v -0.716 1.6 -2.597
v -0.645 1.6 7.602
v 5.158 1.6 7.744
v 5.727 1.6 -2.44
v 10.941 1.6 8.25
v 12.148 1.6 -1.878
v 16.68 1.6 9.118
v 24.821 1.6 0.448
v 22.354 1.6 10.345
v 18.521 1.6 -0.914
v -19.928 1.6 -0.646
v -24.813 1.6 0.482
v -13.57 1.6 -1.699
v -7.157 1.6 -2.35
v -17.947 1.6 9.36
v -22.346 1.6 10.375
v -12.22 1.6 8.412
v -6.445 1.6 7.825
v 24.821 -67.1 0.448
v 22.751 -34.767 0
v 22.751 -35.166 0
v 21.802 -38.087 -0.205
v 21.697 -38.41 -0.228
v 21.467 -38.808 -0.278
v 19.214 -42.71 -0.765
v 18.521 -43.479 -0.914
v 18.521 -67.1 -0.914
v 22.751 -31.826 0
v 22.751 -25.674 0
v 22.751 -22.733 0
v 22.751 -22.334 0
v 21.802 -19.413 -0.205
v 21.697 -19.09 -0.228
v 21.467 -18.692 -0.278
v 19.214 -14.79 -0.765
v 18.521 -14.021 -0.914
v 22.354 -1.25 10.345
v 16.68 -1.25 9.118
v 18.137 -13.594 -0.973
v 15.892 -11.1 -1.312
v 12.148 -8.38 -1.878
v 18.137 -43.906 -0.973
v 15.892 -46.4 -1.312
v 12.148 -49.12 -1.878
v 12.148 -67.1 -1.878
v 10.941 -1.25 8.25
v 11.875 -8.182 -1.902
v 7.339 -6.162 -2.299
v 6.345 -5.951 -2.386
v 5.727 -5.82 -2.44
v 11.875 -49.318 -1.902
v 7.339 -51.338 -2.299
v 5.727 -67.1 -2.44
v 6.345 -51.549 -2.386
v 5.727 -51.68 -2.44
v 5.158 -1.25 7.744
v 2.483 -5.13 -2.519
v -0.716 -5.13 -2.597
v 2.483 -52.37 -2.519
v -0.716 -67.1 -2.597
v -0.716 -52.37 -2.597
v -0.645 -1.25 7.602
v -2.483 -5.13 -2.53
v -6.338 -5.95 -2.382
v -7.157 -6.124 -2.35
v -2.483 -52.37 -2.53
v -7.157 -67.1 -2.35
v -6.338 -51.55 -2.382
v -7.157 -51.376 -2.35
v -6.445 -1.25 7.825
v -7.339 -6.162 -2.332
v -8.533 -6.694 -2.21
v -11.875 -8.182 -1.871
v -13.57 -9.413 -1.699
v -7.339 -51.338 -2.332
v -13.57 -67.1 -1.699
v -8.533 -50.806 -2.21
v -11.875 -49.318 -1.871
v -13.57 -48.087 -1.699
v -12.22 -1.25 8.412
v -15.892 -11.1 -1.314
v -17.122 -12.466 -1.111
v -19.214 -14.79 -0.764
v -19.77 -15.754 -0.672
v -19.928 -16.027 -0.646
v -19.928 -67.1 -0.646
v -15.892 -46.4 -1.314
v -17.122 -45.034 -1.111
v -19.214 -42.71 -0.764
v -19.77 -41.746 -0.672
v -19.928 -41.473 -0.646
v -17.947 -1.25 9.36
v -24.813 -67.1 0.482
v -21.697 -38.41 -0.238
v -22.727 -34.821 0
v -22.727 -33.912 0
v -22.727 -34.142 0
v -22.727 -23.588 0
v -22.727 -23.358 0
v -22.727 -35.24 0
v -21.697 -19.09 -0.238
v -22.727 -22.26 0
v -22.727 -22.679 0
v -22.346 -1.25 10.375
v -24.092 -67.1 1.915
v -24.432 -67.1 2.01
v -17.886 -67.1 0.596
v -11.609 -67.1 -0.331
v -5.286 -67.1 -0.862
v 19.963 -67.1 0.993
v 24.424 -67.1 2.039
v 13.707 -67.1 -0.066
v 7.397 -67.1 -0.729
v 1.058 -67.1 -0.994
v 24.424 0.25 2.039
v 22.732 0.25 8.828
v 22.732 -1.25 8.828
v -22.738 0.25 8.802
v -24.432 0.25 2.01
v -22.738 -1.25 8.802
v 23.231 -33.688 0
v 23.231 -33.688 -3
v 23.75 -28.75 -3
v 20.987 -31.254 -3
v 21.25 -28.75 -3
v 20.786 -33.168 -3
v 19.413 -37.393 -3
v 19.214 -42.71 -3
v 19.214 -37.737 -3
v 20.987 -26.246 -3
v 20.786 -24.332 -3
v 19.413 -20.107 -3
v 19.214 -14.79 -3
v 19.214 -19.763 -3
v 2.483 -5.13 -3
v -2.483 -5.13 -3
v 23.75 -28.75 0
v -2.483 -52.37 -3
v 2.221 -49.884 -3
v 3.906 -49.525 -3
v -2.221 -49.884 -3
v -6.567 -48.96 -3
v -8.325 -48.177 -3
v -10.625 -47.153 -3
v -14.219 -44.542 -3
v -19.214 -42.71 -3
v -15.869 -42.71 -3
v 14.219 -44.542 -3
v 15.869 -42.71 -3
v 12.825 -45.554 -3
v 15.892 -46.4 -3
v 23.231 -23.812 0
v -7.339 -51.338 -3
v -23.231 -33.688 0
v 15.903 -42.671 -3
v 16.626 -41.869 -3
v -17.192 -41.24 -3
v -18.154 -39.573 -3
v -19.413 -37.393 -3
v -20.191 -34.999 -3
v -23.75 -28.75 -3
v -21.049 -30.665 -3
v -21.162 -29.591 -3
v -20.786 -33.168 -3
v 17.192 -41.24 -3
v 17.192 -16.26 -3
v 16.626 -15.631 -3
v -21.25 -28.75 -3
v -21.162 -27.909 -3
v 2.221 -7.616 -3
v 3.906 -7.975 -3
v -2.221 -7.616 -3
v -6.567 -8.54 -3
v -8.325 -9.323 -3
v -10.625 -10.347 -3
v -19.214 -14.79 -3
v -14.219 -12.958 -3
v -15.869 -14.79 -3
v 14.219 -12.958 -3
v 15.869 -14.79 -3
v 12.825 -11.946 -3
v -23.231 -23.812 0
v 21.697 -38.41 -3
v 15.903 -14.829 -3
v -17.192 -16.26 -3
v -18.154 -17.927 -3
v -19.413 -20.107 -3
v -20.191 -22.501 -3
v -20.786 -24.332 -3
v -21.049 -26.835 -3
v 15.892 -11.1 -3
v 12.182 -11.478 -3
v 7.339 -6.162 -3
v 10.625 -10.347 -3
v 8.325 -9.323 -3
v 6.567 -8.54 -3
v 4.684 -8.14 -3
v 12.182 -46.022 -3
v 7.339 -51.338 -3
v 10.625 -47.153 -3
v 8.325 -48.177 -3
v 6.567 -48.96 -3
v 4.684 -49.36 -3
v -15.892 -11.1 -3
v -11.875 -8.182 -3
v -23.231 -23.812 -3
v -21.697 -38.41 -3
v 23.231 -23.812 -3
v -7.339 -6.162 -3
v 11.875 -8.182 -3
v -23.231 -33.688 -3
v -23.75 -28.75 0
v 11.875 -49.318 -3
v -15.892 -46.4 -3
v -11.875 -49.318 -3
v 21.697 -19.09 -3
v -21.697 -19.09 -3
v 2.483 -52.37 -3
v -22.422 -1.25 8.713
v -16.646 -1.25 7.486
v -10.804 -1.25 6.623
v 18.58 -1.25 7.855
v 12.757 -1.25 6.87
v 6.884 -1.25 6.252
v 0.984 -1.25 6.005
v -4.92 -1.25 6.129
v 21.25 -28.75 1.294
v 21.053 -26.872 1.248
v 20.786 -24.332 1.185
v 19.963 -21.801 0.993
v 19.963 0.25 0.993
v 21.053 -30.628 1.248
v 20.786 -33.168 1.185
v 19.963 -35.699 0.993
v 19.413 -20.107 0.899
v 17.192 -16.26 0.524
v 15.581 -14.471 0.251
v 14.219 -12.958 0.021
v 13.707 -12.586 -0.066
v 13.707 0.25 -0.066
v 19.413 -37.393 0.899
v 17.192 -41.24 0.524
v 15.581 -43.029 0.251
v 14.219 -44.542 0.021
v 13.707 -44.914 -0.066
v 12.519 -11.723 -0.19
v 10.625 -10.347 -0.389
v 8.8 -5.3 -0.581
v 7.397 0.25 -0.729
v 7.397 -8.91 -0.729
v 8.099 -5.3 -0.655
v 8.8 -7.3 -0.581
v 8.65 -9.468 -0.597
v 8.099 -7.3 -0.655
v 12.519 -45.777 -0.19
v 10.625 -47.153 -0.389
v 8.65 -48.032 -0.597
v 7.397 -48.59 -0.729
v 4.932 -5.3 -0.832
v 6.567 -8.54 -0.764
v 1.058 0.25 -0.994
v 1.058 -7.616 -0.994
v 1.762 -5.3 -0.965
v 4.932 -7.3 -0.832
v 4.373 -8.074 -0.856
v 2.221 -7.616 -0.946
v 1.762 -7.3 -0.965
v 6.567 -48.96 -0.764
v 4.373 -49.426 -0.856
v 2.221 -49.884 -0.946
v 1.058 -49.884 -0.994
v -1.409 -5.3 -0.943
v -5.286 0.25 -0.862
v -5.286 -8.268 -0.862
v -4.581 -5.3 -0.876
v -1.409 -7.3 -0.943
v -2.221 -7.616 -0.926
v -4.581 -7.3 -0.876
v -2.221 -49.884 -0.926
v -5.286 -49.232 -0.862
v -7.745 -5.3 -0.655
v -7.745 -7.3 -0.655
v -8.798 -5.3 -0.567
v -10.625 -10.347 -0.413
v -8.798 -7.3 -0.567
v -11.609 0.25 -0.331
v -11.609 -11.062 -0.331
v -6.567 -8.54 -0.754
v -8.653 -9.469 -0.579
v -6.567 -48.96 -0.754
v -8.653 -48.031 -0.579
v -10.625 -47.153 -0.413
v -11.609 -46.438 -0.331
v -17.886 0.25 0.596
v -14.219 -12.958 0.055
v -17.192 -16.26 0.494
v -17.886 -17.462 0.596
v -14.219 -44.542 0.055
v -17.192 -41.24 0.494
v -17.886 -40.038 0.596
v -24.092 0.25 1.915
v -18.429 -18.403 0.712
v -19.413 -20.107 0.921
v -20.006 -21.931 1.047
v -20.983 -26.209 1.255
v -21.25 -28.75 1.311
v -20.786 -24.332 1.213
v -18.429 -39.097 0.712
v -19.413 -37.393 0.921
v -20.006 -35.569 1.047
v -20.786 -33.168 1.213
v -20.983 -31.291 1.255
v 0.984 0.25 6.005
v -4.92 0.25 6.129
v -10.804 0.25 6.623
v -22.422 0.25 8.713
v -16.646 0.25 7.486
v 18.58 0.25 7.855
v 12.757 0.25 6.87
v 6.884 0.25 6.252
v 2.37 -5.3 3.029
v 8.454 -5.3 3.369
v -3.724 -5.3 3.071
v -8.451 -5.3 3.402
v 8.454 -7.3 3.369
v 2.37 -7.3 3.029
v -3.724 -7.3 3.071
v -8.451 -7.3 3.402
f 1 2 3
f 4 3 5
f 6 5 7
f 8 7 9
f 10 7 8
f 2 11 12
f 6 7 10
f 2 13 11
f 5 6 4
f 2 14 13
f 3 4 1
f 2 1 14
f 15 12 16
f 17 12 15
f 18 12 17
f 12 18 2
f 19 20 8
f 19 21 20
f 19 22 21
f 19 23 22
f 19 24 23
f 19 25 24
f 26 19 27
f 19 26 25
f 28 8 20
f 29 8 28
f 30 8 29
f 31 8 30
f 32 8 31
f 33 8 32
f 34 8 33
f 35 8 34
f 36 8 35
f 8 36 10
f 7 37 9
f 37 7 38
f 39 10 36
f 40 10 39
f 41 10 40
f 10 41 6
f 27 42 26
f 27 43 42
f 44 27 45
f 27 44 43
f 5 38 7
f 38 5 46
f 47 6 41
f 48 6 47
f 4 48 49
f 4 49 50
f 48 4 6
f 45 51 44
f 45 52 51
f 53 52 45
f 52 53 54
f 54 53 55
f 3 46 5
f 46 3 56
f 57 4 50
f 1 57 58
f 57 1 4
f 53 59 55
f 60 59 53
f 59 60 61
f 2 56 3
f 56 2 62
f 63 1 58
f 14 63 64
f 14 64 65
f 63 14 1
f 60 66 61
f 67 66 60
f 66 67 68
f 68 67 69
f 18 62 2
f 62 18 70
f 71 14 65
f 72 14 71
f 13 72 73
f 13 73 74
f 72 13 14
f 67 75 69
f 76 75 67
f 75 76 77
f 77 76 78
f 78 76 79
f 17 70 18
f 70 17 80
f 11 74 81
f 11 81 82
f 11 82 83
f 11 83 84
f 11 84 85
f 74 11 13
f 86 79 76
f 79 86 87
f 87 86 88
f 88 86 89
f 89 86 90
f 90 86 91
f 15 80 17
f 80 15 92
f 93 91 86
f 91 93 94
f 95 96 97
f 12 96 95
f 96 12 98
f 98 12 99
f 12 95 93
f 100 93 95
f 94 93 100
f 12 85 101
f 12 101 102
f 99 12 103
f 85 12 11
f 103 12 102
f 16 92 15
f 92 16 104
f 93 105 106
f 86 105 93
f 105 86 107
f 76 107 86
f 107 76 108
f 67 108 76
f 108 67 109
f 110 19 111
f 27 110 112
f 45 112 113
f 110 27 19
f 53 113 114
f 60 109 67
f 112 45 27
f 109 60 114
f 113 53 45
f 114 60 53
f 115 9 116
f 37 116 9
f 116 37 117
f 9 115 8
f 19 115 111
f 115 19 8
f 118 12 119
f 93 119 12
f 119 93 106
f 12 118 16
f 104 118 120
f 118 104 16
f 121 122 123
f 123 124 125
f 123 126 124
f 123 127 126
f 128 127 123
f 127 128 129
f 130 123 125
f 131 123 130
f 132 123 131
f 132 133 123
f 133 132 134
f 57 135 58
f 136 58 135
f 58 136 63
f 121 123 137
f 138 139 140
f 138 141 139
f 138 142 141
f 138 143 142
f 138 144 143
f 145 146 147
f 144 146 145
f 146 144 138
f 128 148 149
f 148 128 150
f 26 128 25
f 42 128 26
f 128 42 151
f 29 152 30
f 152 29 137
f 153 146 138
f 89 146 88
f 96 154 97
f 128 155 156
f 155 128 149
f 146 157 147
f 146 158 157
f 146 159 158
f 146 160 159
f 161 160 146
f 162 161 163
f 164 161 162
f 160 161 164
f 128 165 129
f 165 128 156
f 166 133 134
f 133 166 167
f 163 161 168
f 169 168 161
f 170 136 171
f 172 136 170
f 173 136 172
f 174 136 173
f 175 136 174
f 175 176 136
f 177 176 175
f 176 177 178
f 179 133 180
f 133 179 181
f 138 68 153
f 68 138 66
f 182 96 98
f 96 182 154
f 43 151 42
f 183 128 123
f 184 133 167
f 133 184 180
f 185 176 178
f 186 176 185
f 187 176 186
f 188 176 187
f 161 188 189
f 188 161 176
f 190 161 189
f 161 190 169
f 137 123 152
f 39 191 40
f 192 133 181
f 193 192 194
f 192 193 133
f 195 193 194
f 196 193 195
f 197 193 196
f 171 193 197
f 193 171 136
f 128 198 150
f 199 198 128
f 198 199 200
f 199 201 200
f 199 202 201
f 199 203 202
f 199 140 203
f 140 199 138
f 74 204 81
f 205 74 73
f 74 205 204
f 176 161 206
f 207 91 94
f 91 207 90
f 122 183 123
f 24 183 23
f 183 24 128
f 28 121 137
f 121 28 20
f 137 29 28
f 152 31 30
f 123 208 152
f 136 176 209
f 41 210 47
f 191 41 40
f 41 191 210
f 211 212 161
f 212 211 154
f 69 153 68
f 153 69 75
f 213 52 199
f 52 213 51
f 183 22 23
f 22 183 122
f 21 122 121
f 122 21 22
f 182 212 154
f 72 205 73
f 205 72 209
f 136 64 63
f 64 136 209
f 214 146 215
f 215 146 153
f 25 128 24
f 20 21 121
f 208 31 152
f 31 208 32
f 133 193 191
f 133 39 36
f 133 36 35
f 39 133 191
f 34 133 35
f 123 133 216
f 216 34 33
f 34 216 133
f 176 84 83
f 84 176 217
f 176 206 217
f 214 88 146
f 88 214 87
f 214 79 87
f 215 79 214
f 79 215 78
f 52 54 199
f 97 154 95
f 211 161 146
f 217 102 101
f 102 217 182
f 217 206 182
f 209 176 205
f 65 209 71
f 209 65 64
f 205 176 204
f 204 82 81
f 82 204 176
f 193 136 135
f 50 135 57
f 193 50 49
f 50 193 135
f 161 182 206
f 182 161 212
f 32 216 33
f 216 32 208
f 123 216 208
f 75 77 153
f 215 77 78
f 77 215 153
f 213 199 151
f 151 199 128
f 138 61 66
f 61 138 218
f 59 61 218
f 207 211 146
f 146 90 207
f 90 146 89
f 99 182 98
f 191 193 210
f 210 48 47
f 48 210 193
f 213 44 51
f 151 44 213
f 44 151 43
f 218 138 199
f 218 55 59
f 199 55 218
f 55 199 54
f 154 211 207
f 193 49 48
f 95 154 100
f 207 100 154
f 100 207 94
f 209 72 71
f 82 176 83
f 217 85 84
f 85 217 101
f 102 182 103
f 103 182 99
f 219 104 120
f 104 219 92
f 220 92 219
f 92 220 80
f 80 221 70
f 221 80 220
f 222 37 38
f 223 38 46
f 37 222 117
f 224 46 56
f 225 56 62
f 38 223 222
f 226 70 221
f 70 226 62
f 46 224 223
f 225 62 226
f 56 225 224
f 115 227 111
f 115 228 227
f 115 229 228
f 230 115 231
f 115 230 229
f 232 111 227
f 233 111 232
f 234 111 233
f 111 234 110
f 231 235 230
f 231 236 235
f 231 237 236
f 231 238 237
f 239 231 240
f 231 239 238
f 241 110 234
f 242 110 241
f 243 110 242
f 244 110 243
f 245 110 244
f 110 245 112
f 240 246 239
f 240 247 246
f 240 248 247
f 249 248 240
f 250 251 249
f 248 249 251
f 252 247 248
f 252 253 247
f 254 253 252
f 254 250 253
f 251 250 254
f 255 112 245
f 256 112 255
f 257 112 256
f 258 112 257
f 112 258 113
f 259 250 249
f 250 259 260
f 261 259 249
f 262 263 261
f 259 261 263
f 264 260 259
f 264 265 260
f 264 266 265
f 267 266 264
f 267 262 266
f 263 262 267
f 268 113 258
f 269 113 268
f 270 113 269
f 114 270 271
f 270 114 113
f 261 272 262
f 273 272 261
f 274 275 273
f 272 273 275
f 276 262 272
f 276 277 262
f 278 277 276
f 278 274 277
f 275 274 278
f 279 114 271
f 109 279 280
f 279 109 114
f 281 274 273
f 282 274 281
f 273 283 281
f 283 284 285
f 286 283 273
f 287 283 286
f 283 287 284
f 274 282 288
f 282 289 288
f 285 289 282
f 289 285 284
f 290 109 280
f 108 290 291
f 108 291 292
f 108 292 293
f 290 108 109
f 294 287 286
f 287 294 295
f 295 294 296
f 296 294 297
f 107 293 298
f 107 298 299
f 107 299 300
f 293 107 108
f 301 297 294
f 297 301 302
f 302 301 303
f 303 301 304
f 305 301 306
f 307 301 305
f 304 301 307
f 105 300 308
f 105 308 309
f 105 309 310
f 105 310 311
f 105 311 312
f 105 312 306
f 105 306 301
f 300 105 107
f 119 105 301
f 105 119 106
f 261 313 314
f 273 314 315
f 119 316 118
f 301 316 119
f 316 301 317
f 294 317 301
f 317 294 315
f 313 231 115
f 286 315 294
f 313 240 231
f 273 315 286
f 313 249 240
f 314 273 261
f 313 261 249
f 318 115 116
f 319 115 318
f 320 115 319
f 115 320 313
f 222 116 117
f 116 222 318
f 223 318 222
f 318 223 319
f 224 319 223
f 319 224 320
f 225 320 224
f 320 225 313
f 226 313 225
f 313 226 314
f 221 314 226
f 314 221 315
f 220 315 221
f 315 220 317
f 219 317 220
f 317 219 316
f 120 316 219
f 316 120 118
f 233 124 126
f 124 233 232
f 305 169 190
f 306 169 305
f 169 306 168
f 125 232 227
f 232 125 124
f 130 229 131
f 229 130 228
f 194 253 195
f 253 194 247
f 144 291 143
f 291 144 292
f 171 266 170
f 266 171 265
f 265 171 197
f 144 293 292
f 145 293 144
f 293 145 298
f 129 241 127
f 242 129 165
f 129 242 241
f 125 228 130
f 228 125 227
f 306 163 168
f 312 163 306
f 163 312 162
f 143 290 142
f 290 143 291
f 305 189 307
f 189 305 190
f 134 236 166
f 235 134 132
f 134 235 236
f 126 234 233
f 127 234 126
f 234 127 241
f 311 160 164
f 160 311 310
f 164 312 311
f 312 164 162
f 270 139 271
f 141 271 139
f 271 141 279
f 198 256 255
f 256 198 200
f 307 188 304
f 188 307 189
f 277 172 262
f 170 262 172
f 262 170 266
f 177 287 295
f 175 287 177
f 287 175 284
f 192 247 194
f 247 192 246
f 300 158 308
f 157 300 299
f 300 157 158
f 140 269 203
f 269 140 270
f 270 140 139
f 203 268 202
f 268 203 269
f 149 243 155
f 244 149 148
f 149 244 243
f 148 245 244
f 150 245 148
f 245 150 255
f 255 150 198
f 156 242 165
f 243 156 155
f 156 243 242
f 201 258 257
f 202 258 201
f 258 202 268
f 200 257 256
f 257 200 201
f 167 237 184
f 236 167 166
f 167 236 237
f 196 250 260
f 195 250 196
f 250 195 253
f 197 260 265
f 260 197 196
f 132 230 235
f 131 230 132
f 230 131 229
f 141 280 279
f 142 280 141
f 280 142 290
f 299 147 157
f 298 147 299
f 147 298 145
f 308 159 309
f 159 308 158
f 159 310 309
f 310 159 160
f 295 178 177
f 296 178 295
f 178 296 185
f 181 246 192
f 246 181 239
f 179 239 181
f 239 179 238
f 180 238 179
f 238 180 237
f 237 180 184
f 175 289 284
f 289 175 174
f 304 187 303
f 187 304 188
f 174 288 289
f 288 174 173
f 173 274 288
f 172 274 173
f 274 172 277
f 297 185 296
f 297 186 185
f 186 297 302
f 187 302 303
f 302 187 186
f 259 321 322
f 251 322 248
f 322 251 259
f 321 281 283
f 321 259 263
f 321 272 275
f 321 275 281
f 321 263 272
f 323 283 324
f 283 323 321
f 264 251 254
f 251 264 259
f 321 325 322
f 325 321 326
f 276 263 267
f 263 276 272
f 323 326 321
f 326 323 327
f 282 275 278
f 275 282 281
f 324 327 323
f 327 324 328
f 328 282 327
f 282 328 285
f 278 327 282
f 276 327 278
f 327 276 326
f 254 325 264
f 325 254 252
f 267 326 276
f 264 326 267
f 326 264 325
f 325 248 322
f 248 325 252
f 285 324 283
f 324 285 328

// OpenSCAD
/*----------------------------------------------------------------------------
 * Customisable holder for a hygrometer bought from eBay.
 * Created by FeNi64
 * Version 2.0, 2018-05-10
 * Inspired by https://www.thingiverse.com/thing:2429114
 *
 * This program is free software; you can redistribute it and/or modify
 * it under the terms of the GNU General Public License as published by
 * the Free Software Foundation; either version 3 of the License,
 * LGPL version 2.1, or (at your option) any later version of the GPL.
 *
 * This program is distributed in the hope that it will be useful,
 * but WITHOUT ANY WARRANTY; without even the implied warranty of
 * MERCHANTABILITY or FITNESS FOR A PARTICULAR PURPOSE. See the
 * GNU General Public License for more details.
 *
 * You should have received a copy of the GNU General Public License
 * along with this program; if not, write to the Free Software
 * Foundation, Inc., 59 Temple Place, Suite 330, Boston, MA 02111-1307 USA
 *
 *		2018. License, GPL v2 or later
 *----------------------------------------------------------------------------*/

// Mount a hygrometer into the hole for a filament spool

// Styles: 1: A cylinder into the smaller spool_d (Cocoon spools)
//         2: A cylinder into the larger spool_d, with cutouts for the spokes between that and the smaller spool_d (Cocoon spool have this)
//	   3: A flat front for the hygrometer to fit inside the larger spool_d (e.g. MasterSpool)
//	   4: Spans the spool edge, with a flat front (so the spools can stack sideways and it won't extend outside of spool).
//         5: Like 4, but it's a one sided clip, and the other is just a flat top panel. Will stack less well.
style=5;  // [1:Pipes for meter and spool,  2: Spoke-style into spool hole, 3: Front-panel (meter fits into spool hole) 4: Two-edge mounted, 5: One-edge mounted]

// Depth into the spool 
spool_h=10;
// Inside diameter of spool hole (Cocoon: 32, MasterSpool: 52.5)
spool_d=32;// [32-99]
// Inside width of spool hole, for edge-mount style
spool_wi=46;  // [32-99]
// Outside width of spool, for edge-mount style. There's a 1mm grip on each outside, grip_h tall.
spool_wo=65.5; // [32-99]
// Diameter of spool, so we can get the right roundness.
spool3_d=202;  // [150-250]
// Height of the 'edge' on the spool, so we can grip around it.
grip_h=7;

clip_inner=2; // Inner wall of one-sided clip has this gap for the edge to clip into.

// Meter body outside diameter
meter_d=42.5;
// Height of meter body
meter_h=15.0;
// The meter has grips which turn inward 4mm from the inside front edge.
meter2_h=4;
// Cocoon spool is 202mm diameter, 53-65mm wide, have a 2.5mm wall with a 4.5mm thick edge to it, 7mm tall edge.

// Everything is this thick
thickness=1.6; // [0.5-3.0]

/* [Hidden] */
// Angle of the holes on the spoke-style mount.
armangle=45; // There are eight spokes
$fn=120;
ArcWidth=28; // Should really be calculated from the angle of the meter hole plus a bit for surrounds.

if (style == 1) {

    // Cylinder into the 32mm spool
    difference() {
	cylinder(h=spool_h+1,d=spool_d);
	translate([0,0,-1])cylinder(h=spool_h+3,d=spool_d-thickness*2);
    }

    // The interface between the two.
    translate([0,0,spool_h]) difference() {
	cylinder(h=1,d=max(spool_d,meter_d));
	translate([0,0,-1]) cylinder(h=3,d=min(spool_d-thickness*2,meter_d+thickness*2));
    }

    // Where the meter fits.
    translate([0,0,spool_h]) difference() {
	cylinder(h=meter_h,d=meter_d+thickness*2);
	translate([0,0,-1])cylinder(h=meter_h+2,d=meter_d);
    }
} else if (style == 2) {

    // A 'claw' into the larger spool, to fit both MasterSpool and the other spools.
    difference() {
	cylinder(h=spool_h+1,d=spool_d);
	translate([0,0,-1])cylinder(h=spool_h+3,d=spool_d-thickness*2);

	// Minus some holes for the spool spokes
	for(a=[0:armangle:360]) {
	    rotate([0,0,a]) translate([0,-(spool_d+1)/2,-1]) {
		translate([-0.2,0,0])cube([2,spool_d+1,spool_h+1]);
	    }
	}

    }



    // The interface between the two.
    translate([0,0,spool_h]) difference() {
	cylinder(h=1,d=max(spool_d,meter_d));
	translate([0,0,-1]) cylinder(h=3,d=min(spool_d-thickness*2,meter_d+thickness*2));
    }

    // Where the meter fits.
    translate([0,0,spool_h]) difference() {
	cylinder(h=meter_h,d=meter_d+thickness*2);
	translate([0,0,-1])cylinder(h=meter_h+2,d=meter_d);
    }
} else if (style == 3) {
    // A flat front into the 52.5mm spool
    // (52.5mm + 4mm front piece, meter_d hole in a 52.5mm (OD) cylinder.
    if (spool_d < meter_d) {
	echo ("Cannot fit meter into spool hole");
    } else {
	difference() {
	    union() {
		cylinder(h=1,d=spool_d+4);
		cylinder(h=meter2_h,d=spool_d);
	    }
	    translate([0,0,-1]) cylinder(h=spool_h+2,d=meter_d);
	}
    }
} else if (style == 4) {
    // Show spool, during development (remove the 'translate and rotate' from the part below)
    if (0 == 1) {
	%union() {
	    difference() {
		cylinder(h=spool_wo,d=spool3_d);
		translate([0,0,(spool_wo-spool_wi)/2]) cylinder(h=spool_wi,d=spool3_d+1);

		translate([0,0,-0.1]) cylinder(h=1,d=spool3_d - grip_h);
		translate([0,0,spool_wo-1+0.1]) cylinder(h=1,d=spool3_d - grip_h);
	    }
	    cylinder(h=spool_wo,d=spool_d);
	}
    }

    translate([0,0,100])rotate([90,-ArcWidth/2,0]) {
	difference() {
	    union() {
		// The main body
		translate([0,0,-thickness])arc(2*thickness + grip_h,spool_wo+2*thickness,spool3_d/2 + thickness,ArcWidth);
		// A front panel for the meter.
		rotate([90,0,-ArcWidth/2]) translate([0,(spool_wo)/2,spool3_d/2-meter_h/2+6.5])cylinder(h=3,d=meter_d+5);
	    }

	    // Room for the spool
	    translate([0,0,(spool_wo-spool_wi-5)/2-6]) arc(2*thickness + grip_h,spool_wo-3,spool3_d/2 ,ArcWidth);

	    // Minus a gap around the spool edge
	    translate([0,0,(spool_wo-spool_wi)/2-9.5]) arc(grip_h,spool_wo,spool3_d/2,meter_d+0);

	    // Minus a hole for the meter.
	    rotate([90,0,-ArcWidth/2]) translate([0,(spool_wo)/2,spool3_d/2-meter_h/1])cylinder(h=2*meter_h,d=meter_d);
	}
    }

} else if (style == 5) {
    // Show spool, during development (remove the 'translate and rotate' from the part below)
    if (0 == 1) {
	%union() {
	    difference() {
		cylinder(h=spool_wo,d=spool3_d);
		translate([0,0,(spool_wo-spool_wi)/2]) cylinder(h=spool_wi,d=spool3_d+1);

		translate([0,0,-0.1]) cylinder(h=1,d=spool3_d - grip_h);
		translate([0,0,spool_wo-1+0.1]) cylinder(h=1,d=spool3_d - grip_h);
	    }
	    cylinder(h=spool_wo,d=spool_d);
	}
    }

    translate([0,0,100])rotate([90,-ArcWidth/2,0]) {
	union() {
	    difference() {
		union() {
		    // The main body
		    translate([0,0,-thickness])arc(2*thickness + grip_h,spool_wo+2*thickness,spool3_d/2 + thickness,ArcWidth);
		    // A front panel for the meter.
		    rotate([90,0,-ArcWidth/2]) translate([0,(spool_wo)/2-4.0,spool3_d/2-meter_h/2+6.5])cylinder(h=3,d=meter_d+5,$fn=30);
		}

		// Room for the spool
		translate([0,0,(spool_wo-spool_wi-5)/2-6]) rotate([0,0,+1]) arc(2*thickness + grip_h,spool_wo-3,spool3_d/2 ,ArcWidth+2);

		// Minus a gap around the spool edge
		translate([0,0,(spool_wo-spool_wi)/2-10 ]) rotate([0,0,+1]) arc(grip_h,spool_wo,spool3_d/2,ArcWidth+2);
		// One edge has no grip.
		translate([0,0,(spool_wo-spool_wi)/2-0.5]) rotate([0,0,+1]) arc(grip_h+5,spool_wo,spool3_d/2,ArcWidth+2);

		// Minus a hole for the meter.
		// Should replace 'ArcWidth/2 degrees' with some calculation on the arc size
		rotate([90,0,-ArcWidth/2]) translate([0,(spool_wo)/2-4.0,spool3_d/2-meter_h/1])cylinder(h=2*meter_h,d=meter_d,$fn=30);

	    }

	    // Put back an inner edge for the one-sided grip. (5.5mm from the inside of the grip, so there's a 4.5mm gap between this wall and the grip finger.
	    translate([0,0,0.3 + 5.0]) rotate([0,0,-(ArcWidth-10)/2]) arc(grip_h-3,2,spool3_d/2,10);
	}
    }

}

/* module arc()
 * Excerpt from... 
 * 
 * Parametric Encoder Wheel 
 *
 * by Alex Franke (codecreations), March 2012
 * http://www.theFrankes.com
 * 
 * Licenced under Creative Commons Attribution - Non-Commercial - Share Alike 3.0 
 */

module arc( height, depth, radius, degrees ) {
    // This dies a horible death if it's not rendered here 
    // -- sucks up all memory and spins out of control 
    render() {
	difference() {
	    // Outer ring
	    rotate_extrude($fn = 100)
		translate([radius - height, 0, 0])
		square([height,depth]);

	    // Cut half off
	    translate([0,-(radius+1),-.5]) 
		cube ([radius+1,(radius+1)*2,depth+1]);

	    // Cover the other half as necessary
	    rotate([0,0,180-degrees])
		translate([0,-(radius+1),-.5]) 
		cube ([radius+1,(radius+1)*2,depth+1]);

	}
    }
}
